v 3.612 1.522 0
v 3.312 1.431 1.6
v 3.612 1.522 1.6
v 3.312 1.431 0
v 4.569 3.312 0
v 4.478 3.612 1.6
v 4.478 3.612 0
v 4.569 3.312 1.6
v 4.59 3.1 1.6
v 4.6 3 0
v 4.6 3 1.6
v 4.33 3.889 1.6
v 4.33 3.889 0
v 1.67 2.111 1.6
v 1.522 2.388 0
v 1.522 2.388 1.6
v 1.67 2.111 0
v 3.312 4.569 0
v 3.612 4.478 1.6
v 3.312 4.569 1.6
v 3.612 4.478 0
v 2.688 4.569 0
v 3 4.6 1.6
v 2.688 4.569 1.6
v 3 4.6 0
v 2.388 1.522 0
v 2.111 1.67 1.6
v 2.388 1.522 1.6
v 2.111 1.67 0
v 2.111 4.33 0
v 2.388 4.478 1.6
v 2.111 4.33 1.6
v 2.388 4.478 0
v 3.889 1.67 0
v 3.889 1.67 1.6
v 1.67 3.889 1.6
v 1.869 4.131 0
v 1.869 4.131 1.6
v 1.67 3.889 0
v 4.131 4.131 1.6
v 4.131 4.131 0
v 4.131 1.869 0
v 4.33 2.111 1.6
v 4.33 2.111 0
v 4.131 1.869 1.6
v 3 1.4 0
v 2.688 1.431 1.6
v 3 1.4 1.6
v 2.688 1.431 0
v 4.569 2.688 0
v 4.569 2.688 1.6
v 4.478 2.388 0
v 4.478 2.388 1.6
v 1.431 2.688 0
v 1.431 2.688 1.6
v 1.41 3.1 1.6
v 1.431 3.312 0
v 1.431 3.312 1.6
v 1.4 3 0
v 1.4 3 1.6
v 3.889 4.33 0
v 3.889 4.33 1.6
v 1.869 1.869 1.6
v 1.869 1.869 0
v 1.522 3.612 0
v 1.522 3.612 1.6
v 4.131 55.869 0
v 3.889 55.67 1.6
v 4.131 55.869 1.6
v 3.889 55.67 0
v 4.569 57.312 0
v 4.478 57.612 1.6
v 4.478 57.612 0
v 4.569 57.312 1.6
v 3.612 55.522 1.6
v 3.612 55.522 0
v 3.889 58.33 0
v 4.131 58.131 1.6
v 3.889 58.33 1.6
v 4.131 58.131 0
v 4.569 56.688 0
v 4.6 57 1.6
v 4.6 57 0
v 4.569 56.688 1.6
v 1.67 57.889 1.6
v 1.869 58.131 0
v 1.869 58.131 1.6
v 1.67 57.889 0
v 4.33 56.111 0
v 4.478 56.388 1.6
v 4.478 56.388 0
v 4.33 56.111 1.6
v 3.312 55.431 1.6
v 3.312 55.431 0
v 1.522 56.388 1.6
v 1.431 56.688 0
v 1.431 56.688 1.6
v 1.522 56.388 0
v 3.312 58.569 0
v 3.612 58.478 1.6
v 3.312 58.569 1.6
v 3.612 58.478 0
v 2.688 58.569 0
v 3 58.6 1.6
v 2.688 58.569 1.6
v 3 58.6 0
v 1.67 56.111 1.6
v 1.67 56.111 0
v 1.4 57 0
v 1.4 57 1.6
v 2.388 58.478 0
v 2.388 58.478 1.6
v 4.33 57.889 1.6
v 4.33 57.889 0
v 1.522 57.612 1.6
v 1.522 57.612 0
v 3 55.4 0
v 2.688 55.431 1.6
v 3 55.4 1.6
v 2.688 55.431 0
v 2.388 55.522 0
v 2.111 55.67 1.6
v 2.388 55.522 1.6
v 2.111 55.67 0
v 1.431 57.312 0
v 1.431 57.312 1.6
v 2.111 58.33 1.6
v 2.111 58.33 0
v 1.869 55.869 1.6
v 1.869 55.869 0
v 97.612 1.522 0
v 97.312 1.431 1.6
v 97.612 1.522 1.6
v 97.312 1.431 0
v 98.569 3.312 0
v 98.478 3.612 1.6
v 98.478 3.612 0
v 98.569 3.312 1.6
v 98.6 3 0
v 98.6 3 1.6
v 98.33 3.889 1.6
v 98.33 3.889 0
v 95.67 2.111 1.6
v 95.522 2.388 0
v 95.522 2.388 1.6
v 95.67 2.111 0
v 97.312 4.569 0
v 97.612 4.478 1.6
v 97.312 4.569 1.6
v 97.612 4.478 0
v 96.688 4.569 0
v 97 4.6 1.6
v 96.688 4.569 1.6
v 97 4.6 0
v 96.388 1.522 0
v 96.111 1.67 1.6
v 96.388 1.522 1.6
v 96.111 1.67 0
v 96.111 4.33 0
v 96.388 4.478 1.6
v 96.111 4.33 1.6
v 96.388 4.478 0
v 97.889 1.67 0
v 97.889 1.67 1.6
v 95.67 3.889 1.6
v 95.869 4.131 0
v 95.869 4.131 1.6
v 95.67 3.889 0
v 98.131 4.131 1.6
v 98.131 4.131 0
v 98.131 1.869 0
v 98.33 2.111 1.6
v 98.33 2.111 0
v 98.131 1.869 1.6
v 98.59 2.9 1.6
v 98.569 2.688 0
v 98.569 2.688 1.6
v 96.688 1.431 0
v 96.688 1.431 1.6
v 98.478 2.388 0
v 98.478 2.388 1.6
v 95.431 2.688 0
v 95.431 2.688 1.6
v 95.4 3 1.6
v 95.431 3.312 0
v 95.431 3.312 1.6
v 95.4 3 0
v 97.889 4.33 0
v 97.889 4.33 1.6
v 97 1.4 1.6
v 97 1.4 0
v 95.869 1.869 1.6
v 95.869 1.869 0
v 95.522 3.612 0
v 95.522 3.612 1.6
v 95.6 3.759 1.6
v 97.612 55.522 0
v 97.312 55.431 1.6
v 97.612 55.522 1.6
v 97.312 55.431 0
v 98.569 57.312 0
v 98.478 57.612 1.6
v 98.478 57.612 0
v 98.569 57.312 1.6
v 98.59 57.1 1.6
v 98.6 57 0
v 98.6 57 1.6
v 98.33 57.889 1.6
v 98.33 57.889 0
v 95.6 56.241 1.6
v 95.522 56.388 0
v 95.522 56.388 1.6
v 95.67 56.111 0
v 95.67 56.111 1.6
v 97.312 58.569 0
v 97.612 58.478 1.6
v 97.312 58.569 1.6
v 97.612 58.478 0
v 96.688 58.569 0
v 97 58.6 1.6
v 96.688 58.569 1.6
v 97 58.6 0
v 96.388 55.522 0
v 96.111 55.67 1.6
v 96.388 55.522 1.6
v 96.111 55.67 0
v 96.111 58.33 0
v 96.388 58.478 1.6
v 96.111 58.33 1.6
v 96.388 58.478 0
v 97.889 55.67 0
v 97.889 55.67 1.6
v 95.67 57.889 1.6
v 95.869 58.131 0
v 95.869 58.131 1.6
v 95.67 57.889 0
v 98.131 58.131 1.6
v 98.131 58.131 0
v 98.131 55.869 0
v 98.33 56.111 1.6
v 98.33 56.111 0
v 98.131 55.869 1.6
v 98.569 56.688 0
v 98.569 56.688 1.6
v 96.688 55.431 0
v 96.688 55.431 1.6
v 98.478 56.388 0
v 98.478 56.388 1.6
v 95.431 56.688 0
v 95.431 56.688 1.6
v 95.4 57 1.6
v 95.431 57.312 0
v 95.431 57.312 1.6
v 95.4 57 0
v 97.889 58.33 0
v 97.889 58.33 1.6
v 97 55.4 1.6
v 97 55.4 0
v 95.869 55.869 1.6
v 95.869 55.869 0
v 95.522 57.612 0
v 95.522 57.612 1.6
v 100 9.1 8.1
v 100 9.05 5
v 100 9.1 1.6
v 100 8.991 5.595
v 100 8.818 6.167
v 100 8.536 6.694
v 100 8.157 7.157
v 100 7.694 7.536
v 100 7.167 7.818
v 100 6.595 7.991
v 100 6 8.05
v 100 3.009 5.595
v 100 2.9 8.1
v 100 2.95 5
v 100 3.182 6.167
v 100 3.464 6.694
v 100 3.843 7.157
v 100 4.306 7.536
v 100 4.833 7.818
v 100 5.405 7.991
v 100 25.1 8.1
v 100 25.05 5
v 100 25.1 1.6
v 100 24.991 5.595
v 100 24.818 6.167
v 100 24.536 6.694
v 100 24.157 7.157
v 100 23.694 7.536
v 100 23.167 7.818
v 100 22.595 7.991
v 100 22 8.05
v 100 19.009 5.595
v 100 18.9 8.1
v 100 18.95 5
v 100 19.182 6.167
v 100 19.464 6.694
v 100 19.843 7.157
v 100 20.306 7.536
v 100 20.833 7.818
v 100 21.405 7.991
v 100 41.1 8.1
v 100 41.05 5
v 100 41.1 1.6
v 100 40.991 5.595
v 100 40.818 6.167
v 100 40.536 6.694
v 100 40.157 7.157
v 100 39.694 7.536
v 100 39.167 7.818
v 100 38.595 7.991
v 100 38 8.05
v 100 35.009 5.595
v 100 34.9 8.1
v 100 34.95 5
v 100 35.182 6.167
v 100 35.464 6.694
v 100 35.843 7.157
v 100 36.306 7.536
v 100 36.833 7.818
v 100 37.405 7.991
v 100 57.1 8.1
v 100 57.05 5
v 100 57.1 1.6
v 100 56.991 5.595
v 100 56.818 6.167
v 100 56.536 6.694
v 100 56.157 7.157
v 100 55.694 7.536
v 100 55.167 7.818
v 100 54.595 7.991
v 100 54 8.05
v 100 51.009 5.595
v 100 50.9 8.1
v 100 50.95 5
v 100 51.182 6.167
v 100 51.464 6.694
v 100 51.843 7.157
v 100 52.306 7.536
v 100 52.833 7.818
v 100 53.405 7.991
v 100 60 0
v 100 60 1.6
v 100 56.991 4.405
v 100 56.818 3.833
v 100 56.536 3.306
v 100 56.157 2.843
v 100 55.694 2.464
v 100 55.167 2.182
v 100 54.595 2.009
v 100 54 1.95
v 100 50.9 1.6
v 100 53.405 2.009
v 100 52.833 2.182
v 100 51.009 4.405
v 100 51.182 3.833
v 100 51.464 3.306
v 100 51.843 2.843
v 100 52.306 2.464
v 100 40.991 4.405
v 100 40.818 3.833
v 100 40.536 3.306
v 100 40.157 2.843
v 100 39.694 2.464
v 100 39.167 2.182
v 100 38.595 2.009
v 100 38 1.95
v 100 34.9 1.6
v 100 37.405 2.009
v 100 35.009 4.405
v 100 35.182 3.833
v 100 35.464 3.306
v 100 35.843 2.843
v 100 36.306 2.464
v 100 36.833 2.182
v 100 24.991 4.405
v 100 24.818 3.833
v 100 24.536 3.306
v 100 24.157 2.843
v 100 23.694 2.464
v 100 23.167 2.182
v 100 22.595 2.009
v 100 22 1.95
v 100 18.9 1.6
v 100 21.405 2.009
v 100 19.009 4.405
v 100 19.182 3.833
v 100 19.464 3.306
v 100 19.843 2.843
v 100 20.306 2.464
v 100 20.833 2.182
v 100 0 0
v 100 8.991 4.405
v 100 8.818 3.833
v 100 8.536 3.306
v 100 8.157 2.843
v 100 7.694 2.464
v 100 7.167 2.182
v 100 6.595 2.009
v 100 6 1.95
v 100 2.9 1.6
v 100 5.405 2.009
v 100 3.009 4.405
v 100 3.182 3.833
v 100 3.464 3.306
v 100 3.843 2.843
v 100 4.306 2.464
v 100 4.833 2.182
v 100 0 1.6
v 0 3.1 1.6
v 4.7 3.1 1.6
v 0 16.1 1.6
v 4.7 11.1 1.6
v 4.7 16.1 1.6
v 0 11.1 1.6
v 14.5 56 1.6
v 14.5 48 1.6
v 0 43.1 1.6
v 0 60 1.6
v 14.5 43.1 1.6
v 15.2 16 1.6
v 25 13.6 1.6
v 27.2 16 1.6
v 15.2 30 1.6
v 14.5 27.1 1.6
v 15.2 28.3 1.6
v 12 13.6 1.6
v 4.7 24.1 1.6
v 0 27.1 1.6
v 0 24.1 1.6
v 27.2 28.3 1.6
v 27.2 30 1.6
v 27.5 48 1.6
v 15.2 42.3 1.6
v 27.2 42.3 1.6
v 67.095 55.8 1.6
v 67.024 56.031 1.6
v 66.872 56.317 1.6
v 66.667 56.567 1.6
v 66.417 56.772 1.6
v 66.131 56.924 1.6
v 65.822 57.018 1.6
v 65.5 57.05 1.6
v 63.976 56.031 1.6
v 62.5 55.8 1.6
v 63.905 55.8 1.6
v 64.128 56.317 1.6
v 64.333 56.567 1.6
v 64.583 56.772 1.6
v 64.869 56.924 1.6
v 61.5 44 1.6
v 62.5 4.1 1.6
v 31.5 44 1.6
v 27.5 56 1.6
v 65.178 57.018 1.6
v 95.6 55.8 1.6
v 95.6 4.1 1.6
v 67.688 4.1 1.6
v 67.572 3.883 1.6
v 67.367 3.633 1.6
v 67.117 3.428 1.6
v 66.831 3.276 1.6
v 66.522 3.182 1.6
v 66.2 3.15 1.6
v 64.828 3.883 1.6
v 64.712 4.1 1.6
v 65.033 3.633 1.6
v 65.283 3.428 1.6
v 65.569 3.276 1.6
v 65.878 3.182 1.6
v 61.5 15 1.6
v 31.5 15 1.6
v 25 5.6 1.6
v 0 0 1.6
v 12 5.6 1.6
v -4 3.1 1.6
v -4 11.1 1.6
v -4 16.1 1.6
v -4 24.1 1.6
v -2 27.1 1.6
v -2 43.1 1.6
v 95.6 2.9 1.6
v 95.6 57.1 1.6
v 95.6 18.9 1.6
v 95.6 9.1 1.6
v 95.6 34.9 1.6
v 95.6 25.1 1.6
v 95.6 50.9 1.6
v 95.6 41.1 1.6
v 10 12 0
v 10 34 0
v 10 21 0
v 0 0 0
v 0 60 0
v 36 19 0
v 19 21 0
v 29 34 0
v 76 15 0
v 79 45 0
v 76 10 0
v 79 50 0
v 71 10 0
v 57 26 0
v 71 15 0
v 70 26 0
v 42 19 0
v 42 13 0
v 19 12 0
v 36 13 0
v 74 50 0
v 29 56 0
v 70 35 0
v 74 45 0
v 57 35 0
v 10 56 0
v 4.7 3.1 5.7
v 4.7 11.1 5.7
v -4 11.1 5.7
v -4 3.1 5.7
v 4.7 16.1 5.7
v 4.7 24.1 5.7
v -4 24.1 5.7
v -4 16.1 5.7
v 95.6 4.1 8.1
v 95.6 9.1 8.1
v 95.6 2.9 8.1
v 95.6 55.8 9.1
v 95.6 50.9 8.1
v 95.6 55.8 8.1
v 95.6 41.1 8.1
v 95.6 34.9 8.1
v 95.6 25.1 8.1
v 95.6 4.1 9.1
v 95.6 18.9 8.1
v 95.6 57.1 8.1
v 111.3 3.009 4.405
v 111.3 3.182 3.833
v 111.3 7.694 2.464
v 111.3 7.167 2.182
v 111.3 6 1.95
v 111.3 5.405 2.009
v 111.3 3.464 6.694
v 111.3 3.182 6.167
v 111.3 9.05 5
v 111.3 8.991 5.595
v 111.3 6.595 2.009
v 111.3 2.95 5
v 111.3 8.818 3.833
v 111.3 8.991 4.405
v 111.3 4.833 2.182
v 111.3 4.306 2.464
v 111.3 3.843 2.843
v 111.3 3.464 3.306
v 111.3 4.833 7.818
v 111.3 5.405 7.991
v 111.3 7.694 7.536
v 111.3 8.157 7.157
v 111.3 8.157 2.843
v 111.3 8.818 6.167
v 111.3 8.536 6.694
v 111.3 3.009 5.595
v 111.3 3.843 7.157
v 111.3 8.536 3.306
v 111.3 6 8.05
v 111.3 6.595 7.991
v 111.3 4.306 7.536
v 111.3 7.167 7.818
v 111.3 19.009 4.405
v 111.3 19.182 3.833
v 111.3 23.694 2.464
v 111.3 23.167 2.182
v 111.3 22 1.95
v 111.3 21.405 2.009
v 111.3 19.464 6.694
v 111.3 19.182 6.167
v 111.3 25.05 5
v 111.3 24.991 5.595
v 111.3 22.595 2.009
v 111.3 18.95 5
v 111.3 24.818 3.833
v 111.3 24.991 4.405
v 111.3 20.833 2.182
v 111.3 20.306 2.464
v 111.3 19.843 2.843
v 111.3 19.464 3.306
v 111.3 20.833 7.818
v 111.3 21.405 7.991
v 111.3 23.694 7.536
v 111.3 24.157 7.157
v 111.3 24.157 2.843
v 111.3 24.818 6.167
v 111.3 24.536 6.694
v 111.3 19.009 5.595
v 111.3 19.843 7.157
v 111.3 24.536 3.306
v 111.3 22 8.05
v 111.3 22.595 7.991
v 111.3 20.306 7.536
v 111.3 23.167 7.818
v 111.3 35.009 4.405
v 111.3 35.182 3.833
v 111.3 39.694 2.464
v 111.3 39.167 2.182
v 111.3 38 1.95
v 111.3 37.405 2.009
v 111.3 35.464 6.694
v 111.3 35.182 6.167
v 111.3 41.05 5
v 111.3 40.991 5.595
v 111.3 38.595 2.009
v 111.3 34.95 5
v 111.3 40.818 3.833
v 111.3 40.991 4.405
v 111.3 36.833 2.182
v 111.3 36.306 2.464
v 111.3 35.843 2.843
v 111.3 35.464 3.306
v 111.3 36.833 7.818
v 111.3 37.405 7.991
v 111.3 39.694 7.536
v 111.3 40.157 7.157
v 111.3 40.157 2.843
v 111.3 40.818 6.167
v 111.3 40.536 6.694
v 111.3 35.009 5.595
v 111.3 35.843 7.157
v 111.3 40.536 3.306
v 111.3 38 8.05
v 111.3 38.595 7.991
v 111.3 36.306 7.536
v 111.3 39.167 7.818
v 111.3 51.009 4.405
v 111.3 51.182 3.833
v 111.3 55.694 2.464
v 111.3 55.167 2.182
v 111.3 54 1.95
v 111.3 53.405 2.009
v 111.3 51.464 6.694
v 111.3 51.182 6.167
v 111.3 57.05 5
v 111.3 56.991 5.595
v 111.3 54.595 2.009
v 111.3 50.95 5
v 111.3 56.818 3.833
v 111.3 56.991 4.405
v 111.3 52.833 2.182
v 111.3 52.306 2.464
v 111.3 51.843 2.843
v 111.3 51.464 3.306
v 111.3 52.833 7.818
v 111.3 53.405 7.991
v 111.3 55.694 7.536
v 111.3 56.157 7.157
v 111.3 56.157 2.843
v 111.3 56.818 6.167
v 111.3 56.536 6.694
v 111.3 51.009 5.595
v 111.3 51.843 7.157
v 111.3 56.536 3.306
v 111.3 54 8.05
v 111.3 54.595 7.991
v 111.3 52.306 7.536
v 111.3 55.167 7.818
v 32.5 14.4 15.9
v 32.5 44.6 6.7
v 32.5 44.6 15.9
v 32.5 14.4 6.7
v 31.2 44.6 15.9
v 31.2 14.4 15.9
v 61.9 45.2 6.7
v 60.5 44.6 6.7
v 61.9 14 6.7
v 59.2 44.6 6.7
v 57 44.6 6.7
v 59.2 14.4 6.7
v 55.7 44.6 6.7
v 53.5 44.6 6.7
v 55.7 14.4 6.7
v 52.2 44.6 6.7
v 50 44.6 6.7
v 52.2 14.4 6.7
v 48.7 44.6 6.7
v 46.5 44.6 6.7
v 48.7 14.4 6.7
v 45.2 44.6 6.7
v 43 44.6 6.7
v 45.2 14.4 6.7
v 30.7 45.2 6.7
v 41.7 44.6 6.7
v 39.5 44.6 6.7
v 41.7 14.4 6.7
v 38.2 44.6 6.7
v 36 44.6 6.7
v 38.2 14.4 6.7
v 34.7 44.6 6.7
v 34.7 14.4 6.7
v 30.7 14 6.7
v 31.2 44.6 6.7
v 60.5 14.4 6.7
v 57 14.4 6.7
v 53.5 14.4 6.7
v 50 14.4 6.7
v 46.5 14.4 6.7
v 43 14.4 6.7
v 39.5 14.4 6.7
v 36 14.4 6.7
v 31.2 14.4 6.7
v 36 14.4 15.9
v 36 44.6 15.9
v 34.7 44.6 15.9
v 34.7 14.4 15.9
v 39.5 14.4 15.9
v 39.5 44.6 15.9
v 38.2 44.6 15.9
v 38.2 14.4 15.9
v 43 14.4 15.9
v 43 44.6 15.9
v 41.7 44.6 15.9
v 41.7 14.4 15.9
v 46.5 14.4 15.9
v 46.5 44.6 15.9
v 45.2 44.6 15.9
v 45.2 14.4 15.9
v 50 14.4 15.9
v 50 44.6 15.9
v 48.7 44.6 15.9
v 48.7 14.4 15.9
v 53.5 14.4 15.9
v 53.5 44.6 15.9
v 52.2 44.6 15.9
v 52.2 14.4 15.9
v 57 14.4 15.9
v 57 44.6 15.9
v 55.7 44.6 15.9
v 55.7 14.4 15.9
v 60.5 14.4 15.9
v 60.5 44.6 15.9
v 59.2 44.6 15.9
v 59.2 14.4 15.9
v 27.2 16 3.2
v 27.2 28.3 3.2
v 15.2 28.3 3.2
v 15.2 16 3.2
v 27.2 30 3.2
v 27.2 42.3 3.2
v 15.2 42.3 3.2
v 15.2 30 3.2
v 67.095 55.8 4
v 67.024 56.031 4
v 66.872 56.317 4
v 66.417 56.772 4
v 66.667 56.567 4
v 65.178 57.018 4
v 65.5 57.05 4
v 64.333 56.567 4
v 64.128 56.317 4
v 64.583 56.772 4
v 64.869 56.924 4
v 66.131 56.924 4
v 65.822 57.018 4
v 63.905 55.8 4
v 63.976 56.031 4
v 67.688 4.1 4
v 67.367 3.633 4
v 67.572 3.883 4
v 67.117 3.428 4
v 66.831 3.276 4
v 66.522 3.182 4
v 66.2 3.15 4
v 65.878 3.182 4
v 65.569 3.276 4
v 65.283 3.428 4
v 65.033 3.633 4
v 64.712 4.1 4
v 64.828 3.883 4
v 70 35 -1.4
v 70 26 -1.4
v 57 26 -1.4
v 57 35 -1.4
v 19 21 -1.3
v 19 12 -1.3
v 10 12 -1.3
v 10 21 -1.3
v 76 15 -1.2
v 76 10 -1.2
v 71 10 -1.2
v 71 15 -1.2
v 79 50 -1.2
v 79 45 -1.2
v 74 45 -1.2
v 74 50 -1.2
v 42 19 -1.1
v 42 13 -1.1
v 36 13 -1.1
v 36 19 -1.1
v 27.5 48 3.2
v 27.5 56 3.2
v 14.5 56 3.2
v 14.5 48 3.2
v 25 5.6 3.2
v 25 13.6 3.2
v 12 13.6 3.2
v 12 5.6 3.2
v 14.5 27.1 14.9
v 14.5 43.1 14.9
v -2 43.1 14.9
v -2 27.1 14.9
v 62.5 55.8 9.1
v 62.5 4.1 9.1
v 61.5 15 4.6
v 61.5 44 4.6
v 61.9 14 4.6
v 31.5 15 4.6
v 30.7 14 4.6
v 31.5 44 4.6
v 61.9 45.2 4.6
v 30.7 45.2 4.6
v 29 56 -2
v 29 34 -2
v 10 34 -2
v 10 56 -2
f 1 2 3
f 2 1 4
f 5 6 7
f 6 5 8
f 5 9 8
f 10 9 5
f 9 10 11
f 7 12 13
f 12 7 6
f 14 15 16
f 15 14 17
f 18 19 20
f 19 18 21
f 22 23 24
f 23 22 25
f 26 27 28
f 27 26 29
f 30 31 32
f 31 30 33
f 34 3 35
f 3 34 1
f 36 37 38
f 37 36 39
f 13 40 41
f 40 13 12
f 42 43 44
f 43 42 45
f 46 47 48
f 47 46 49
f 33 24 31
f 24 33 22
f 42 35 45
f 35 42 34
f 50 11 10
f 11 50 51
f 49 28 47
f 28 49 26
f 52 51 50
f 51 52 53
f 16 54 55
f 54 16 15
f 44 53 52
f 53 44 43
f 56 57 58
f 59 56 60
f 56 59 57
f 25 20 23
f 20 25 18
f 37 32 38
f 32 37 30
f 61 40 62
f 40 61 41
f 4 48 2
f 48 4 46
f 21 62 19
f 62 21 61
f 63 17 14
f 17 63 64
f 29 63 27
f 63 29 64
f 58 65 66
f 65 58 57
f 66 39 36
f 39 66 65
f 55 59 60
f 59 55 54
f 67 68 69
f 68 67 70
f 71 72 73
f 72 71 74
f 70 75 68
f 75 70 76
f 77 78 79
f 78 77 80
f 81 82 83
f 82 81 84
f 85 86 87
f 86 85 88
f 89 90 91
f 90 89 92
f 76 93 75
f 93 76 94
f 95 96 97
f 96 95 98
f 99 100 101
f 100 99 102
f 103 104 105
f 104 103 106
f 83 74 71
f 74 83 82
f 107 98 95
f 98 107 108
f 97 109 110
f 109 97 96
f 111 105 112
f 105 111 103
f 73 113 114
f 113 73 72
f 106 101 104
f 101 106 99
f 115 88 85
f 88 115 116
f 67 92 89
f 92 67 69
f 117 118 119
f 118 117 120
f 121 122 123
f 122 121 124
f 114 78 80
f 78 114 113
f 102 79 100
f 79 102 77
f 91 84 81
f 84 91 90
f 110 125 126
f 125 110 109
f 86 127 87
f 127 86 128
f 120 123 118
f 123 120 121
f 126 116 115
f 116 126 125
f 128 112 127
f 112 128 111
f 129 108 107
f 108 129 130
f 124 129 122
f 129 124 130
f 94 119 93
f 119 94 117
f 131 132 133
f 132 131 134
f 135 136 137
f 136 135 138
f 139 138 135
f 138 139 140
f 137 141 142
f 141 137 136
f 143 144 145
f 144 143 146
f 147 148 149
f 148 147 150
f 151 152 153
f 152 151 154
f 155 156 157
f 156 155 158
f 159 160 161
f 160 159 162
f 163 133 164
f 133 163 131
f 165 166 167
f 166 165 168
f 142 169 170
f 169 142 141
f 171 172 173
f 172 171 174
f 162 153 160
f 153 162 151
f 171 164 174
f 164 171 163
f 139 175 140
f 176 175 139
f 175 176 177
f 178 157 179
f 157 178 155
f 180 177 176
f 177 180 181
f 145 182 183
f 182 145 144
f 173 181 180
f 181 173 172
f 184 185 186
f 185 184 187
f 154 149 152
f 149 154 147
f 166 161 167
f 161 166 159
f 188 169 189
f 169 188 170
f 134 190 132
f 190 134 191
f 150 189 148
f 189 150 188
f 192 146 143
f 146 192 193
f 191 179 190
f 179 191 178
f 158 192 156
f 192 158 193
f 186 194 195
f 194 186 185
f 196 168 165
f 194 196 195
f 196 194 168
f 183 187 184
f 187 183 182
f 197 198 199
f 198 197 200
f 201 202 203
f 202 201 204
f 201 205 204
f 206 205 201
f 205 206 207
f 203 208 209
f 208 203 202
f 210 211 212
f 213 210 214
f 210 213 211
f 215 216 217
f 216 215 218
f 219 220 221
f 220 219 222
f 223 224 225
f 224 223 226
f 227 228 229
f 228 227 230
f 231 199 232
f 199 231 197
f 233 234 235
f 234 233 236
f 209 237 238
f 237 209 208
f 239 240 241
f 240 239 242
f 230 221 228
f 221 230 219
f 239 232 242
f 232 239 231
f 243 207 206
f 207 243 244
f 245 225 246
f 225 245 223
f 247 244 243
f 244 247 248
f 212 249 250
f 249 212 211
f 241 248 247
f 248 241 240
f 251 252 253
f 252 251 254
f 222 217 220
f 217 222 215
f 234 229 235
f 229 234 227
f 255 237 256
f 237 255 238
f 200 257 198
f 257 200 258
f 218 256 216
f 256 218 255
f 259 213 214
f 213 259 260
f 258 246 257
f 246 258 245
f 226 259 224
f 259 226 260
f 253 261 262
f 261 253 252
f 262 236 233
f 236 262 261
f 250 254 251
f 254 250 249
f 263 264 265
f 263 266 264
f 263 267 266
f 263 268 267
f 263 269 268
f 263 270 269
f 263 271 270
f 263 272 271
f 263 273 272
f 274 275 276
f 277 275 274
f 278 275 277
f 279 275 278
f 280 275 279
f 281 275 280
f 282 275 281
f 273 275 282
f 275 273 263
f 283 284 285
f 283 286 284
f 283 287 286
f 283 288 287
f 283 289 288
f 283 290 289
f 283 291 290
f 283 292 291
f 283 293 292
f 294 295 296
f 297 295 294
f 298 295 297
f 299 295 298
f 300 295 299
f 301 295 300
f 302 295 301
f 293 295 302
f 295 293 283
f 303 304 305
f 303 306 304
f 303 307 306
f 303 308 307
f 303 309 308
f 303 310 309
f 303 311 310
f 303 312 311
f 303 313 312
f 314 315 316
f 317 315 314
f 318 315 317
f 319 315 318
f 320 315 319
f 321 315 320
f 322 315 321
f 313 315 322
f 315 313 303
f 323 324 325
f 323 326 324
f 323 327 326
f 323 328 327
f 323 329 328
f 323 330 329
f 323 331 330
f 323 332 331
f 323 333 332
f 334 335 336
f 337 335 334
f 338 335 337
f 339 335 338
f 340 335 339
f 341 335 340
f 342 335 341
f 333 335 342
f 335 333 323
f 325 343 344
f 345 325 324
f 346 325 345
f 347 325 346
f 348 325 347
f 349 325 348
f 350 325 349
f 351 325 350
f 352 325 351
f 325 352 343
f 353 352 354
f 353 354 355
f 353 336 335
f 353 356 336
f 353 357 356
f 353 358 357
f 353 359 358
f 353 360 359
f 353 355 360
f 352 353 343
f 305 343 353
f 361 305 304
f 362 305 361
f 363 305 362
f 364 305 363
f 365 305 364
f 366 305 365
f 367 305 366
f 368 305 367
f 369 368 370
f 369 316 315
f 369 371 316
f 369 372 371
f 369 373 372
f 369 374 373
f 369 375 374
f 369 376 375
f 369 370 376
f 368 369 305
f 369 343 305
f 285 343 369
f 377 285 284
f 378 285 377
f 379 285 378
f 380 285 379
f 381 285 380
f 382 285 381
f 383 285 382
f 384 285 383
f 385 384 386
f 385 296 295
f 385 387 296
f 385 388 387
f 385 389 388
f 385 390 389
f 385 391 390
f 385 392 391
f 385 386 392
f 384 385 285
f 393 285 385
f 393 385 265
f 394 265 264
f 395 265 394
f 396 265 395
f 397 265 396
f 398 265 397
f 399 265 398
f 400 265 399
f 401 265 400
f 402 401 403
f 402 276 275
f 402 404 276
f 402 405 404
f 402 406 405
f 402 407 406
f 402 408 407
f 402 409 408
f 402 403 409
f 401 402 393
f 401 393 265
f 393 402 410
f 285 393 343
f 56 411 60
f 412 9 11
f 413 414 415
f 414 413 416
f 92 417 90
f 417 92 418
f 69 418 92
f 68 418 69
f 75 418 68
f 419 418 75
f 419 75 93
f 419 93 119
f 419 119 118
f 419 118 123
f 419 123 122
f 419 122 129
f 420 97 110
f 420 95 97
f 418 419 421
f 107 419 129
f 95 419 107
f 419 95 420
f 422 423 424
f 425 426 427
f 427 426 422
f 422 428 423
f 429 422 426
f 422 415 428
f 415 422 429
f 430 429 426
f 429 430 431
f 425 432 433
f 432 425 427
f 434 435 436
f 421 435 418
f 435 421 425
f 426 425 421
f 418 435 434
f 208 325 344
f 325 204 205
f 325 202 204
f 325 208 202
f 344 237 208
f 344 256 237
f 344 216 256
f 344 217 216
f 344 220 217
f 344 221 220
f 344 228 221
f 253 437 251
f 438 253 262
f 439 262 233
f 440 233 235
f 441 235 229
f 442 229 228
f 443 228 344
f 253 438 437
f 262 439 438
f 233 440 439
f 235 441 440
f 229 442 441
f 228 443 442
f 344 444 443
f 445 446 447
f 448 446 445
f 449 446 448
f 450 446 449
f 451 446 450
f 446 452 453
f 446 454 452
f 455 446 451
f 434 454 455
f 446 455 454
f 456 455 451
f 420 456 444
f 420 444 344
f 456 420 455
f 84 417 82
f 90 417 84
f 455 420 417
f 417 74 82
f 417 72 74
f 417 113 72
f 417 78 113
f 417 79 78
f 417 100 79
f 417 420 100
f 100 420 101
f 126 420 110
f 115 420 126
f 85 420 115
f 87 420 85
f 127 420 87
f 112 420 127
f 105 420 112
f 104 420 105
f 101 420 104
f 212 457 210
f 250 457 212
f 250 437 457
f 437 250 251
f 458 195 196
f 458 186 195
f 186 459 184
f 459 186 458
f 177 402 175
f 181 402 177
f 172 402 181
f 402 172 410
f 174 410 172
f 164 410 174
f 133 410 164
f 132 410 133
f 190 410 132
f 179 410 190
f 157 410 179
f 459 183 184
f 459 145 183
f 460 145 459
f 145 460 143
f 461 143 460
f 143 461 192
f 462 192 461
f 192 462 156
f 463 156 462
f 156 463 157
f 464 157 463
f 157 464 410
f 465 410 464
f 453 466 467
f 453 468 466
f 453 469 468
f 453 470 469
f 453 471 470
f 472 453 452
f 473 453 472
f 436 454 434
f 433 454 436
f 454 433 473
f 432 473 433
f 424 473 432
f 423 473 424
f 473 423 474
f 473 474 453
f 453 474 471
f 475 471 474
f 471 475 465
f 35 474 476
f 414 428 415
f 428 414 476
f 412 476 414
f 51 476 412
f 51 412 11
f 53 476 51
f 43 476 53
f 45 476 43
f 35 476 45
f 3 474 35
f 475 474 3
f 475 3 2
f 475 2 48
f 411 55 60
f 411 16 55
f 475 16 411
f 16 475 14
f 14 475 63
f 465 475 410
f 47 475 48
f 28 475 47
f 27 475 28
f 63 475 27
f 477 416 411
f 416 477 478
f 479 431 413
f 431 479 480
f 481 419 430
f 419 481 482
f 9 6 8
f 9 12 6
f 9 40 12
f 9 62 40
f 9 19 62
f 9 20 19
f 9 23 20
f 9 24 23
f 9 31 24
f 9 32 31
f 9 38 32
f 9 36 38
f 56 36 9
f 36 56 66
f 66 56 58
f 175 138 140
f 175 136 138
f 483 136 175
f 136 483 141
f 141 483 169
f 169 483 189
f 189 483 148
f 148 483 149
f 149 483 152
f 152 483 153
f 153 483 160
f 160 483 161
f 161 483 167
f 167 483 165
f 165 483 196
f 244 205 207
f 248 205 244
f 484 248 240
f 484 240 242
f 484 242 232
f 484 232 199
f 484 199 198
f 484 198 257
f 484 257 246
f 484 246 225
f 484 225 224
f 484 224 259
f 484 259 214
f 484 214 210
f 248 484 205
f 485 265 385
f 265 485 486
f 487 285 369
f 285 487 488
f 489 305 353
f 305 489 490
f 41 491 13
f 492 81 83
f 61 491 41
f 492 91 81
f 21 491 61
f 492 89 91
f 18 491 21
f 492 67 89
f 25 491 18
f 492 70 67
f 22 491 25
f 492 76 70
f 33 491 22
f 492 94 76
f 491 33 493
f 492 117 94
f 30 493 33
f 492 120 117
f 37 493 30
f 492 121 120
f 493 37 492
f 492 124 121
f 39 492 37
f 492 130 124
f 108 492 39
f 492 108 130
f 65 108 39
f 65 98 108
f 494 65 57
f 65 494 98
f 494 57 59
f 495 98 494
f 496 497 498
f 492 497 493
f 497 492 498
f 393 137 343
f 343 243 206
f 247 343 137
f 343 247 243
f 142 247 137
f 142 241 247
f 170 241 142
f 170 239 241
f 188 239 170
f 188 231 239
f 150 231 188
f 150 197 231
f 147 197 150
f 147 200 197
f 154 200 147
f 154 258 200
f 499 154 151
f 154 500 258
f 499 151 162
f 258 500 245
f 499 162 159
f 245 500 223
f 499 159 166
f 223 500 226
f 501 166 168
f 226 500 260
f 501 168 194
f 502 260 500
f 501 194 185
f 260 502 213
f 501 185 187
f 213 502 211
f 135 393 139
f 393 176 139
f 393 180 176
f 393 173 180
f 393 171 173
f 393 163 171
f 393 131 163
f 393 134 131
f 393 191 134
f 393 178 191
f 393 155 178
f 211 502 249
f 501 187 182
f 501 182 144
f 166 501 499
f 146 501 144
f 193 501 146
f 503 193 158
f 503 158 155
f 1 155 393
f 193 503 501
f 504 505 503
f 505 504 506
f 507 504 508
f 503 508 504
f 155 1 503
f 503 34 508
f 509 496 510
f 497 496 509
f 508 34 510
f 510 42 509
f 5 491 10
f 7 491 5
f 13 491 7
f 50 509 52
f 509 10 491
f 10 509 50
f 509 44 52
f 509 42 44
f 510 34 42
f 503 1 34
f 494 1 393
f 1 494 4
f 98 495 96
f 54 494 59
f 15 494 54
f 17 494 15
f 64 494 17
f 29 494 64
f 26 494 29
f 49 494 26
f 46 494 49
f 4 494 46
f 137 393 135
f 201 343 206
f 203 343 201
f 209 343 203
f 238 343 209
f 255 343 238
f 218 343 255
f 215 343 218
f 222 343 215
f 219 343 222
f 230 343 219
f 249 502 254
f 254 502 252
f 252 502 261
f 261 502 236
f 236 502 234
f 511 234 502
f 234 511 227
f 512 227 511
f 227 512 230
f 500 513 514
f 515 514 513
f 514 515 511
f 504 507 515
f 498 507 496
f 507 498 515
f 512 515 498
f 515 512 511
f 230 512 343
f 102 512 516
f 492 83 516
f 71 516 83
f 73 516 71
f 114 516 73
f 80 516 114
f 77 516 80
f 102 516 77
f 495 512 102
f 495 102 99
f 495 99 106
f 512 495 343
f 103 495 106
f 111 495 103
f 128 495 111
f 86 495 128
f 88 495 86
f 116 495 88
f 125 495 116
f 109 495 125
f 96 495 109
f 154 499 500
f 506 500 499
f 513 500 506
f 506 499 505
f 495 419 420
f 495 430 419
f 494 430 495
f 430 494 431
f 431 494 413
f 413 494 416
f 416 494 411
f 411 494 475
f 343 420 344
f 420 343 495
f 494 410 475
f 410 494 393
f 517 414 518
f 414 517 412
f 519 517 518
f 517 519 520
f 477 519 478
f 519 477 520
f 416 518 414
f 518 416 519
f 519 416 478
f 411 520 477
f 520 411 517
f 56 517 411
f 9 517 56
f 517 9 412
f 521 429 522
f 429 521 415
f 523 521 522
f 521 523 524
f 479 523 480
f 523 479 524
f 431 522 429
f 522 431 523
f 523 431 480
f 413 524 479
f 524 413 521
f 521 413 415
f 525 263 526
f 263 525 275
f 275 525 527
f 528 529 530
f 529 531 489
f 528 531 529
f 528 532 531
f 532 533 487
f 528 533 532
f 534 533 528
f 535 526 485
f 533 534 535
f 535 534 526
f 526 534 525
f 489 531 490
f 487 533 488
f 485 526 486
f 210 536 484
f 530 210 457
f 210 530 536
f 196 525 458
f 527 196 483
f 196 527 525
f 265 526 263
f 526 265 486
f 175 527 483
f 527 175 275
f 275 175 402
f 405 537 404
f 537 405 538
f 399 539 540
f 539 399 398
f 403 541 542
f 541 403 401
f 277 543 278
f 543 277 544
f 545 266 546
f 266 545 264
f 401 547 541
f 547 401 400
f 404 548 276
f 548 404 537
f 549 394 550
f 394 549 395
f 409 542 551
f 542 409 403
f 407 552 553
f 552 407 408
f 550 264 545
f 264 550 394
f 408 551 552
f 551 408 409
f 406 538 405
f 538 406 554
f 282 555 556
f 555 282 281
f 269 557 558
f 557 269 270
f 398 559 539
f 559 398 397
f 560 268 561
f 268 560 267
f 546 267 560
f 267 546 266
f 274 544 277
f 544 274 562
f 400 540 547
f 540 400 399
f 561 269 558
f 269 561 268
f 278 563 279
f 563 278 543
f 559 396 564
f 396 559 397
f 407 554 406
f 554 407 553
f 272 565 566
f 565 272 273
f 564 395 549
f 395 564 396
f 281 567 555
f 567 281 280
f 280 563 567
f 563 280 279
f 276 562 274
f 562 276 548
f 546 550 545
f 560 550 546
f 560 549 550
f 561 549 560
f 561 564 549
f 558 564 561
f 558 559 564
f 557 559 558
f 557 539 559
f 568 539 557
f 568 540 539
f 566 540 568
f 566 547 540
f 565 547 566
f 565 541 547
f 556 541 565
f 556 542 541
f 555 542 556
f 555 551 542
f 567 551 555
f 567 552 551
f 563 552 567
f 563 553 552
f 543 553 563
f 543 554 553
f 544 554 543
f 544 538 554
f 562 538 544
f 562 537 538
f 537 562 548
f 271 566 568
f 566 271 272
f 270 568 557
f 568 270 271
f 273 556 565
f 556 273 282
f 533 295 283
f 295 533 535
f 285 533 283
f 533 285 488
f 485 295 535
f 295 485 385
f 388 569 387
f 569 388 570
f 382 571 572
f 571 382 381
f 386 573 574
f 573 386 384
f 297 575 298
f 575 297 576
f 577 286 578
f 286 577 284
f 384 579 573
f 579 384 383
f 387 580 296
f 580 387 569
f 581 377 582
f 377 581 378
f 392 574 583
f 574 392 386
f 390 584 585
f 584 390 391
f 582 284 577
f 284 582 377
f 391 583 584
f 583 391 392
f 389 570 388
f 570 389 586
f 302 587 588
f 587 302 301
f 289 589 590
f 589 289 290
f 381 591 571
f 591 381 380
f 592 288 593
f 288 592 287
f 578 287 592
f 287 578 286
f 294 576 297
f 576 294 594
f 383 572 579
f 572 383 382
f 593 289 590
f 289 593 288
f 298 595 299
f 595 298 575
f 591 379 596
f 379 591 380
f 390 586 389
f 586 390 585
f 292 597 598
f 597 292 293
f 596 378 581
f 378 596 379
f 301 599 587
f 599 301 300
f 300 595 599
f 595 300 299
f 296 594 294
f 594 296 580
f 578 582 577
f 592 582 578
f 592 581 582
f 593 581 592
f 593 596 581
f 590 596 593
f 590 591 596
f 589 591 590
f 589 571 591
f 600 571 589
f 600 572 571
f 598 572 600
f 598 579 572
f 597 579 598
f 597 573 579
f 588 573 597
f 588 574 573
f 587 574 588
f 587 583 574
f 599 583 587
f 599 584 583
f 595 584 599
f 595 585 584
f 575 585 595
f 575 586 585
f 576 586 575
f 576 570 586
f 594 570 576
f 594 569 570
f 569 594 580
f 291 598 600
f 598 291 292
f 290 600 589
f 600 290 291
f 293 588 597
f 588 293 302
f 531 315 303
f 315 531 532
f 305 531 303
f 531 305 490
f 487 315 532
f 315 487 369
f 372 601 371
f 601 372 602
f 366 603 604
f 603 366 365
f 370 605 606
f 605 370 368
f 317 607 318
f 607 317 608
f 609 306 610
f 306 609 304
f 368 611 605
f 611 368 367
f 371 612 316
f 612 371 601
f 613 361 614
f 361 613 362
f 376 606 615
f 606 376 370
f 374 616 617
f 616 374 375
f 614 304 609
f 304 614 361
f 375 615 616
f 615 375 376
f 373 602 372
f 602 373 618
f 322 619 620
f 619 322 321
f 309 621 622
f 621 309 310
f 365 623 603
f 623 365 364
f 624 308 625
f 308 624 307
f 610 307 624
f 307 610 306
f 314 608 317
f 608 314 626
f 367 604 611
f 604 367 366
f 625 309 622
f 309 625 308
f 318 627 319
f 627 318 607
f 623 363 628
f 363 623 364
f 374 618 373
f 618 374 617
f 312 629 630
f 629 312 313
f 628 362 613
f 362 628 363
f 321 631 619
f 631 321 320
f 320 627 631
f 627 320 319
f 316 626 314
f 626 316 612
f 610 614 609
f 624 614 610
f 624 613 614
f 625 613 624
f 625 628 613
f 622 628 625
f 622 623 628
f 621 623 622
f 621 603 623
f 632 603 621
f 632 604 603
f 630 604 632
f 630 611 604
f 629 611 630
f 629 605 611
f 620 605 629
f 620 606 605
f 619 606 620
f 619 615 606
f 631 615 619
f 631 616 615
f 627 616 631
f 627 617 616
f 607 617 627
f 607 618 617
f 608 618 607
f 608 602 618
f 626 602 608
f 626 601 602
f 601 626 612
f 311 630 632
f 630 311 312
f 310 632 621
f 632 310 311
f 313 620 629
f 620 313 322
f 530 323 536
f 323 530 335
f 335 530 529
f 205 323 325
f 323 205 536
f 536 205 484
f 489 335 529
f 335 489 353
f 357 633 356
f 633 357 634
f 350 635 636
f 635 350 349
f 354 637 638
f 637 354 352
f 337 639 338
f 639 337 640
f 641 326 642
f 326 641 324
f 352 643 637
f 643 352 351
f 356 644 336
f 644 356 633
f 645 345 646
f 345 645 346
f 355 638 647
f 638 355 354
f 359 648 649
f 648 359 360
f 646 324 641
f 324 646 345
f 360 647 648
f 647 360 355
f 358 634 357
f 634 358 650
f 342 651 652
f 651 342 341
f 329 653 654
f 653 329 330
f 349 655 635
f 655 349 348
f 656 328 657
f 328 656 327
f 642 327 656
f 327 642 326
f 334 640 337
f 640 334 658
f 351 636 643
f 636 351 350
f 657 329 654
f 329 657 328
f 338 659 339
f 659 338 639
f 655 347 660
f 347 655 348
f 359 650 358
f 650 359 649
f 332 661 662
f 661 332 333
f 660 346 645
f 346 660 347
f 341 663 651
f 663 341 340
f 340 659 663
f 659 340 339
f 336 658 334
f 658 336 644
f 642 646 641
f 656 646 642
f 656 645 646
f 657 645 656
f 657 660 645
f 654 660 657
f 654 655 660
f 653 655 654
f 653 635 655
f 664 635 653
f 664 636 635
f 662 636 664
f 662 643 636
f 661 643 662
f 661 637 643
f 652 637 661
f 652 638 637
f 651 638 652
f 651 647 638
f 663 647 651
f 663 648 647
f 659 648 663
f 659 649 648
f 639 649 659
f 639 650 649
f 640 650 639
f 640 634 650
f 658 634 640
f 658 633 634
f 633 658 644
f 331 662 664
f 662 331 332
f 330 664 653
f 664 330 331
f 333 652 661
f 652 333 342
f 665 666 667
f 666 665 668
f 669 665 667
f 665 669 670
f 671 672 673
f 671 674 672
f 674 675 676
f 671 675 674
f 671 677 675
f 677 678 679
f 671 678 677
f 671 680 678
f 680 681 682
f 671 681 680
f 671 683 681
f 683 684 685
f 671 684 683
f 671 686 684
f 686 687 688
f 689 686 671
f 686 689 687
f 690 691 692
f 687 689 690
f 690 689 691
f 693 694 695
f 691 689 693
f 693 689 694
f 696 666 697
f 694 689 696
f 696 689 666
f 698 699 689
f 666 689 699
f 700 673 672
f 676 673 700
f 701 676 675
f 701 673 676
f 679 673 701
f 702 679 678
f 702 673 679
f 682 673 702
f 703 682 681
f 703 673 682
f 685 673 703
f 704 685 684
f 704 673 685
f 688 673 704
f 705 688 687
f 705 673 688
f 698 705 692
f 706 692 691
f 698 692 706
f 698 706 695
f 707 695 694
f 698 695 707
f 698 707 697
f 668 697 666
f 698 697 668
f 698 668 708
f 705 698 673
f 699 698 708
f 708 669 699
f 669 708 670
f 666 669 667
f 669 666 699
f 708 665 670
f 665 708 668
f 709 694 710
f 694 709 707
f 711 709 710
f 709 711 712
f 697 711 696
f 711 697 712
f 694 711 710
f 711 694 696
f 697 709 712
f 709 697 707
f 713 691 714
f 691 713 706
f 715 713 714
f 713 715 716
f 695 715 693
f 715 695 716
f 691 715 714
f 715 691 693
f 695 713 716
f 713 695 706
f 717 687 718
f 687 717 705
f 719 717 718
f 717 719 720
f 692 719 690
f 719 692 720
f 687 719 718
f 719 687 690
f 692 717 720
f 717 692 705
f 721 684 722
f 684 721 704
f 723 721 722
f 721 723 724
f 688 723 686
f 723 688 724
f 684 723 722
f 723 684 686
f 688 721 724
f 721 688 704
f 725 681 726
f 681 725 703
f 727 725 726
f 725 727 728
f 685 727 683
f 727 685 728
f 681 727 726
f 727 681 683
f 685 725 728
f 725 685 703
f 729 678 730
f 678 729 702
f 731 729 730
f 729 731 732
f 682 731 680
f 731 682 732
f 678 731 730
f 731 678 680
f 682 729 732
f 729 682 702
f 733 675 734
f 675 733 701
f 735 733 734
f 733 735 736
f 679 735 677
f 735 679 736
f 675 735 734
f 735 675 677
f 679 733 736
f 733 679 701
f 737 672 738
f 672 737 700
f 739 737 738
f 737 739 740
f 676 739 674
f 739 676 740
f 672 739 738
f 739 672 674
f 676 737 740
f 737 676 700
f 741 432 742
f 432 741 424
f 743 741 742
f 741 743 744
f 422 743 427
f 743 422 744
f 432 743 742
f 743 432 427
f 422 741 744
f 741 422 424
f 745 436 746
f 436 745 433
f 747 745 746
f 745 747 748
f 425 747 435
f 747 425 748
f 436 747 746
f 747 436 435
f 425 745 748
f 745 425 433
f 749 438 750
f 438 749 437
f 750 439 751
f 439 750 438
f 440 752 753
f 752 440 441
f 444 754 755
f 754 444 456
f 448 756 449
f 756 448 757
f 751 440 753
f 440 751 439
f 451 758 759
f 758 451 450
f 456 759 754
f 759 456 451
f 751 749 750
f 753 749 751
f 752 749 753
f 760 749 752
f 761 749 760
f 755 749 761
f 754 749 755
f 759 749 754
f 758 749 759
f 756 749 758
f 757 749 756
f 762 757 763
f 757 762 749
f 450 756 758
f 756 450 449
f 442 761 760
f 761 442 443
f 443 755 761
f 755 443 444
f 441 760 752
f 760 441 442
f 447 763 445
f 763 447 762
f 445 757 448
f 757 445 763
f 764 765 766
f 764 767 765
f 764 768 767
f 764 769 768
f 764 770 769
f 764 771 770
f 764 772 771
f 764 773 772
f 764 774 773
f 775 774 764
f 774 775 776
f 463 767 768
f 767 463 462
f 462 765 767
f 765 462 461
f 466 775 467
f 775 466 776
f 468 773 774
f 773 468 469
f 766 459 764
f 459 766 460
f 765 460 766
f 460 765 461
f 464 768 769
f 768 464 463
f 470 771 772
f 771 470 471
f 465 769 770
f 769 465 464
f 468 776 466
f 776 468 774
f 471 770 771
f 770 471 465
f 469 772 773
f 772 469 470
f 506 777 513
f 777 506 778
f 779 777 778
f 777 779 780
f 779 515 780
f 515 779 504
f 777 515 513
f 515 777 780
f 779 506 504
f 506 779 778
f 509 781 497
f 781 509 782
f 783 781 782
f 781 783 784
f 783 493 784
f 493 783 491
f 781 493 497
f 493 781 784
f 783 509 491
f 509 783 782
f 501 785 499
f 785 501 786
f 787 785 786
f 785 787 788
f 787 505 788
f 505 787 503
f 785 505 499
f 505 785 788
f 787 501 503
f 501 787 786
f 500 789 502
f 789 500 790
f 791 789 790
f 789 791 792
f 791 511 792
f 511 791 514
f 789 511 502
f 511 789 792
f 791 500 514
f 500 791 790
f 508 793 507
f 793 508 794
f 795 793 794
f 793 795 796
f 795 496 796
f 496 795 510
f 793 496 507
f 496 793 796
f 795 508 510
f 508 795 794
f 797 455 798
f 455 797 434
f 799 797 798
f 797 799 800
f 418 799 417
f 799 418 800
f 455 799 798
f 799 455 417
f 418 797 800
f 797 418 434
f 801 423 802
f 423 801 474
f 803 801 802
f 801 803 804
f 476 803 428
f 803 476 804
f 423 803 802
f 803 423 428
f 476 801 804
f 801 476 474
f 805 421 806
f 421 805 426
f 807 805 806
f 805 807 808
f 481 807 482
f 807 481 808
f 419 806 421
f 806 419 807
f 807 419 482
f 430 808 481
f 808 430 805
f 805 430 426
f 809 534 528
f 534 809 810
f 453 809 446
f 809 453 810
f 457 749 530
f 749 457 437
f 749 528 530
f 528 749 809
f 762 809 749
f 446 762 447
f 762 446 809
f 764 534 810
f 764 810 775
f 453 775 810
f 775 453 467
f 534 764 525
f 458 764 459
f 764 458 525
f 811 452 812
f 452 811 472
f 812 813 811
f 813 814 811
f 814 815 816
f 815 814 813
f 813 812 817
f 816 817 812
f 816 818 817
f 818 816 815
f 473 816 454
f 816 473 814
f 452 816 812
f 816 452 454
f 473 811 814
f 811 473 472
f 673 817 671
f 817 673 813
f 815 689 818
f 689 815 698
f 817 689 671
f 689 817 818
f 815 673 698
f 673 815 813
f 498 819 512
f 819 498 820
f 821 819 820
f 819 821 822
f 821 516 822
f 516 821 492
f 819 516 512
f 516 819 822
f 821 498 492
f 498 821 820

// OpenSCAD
// ANTSDR E310 Rev.C 23-E310B25-20 enclosure-clearance model
// Units: mm. Photo-derived approximations, NOT verified mechanical tolerances.
// Compare with MicroPhase ANT_E310_ES2_Mechanical.dxf before manufacture.
// X=0 Ethernet/USB end; X=100 SMA end. Component side is +Z.
$fn=32;
module cube_at(x,y,z,w,d,h){ translate([x,y,z]) cube([w,d,h]); }
module shaft_x(x,y,z,r,l){translate([x,y,z])rotate([0,90,0])cylinder(h=l,r=r);}
module pcb(){
 difference(){
  color([0.05,0.17,0.13]) cube_at(0,0,0,100,60,1.6);
  // mounting hole positions provisional: refer to original DXF for exact drill file
  for(x=[3,97],y=[3,57])translate([x,y,-0.5])cylinder(h=3,r=1.6);
 }
}
module assembly(){
 pcb();
 // two USB Type C at interface end; no micro-USB
 color("silver")for(y=[7.1,20.1])cube_at(-4,y-4,1.6,8.7,8,4.1);
 // RJ45
 color("silver")cube_at(-2,27.1,1.6,16.5,16,13.3);
 // four edge mounted SMA
 color("gold")for(y=[6,22,38,54]){
   cube_at(95.6,y-3.1,1.6,4.4,6.2,6.5);
   shaft_x(100,y,5,3.05,11.3);
 }
 // RF shield + heatsink
 color("silver")cube_at(62.5,4.1,1.6,33.1,51.7,7.5);
 color("black")cube_at(31.5,15,1.6,30,29,3);
 color("black")cube_at(30.7,14,4.6,31.2,31.2,2.1);
 color("black")for(i=[0:8])cube_at(31.2+i*3.5,14.4,6.7,1.3,30.2,9.2);
 color("black")for(y=[16,30])cube_at(15.2,y,1.6,12,12.3,1.6);
 // underside microSD (towards Ethernet)
 color("silver")cube_at(10,34,-2,19,22,2);
 // small onboard connector models; NOT antenna-port validation
 color("gold")for(p=[[65.5,55.4],[66.2,4.8]])translate([p[0],p[1],1.6])cylinder(h=2.4,r=1.65);
 color("black"){
  cube_at(14.5,48,1.6,13,8,1.6);
  cube_at(12,5.6,1.6,13,8,1.6);
  for(a=[[57,26,13,9,1.4],[10,12,9,9,1.3],[13,45,8,8,1.3],[71,10,5,5,1.2],[74,45,5,5,1.2],[36,13,6,6,1.1]])
   cube_at(a[0],a[1],-a[4],a[2],a[3],a[4]);
 }
}
assembly();
